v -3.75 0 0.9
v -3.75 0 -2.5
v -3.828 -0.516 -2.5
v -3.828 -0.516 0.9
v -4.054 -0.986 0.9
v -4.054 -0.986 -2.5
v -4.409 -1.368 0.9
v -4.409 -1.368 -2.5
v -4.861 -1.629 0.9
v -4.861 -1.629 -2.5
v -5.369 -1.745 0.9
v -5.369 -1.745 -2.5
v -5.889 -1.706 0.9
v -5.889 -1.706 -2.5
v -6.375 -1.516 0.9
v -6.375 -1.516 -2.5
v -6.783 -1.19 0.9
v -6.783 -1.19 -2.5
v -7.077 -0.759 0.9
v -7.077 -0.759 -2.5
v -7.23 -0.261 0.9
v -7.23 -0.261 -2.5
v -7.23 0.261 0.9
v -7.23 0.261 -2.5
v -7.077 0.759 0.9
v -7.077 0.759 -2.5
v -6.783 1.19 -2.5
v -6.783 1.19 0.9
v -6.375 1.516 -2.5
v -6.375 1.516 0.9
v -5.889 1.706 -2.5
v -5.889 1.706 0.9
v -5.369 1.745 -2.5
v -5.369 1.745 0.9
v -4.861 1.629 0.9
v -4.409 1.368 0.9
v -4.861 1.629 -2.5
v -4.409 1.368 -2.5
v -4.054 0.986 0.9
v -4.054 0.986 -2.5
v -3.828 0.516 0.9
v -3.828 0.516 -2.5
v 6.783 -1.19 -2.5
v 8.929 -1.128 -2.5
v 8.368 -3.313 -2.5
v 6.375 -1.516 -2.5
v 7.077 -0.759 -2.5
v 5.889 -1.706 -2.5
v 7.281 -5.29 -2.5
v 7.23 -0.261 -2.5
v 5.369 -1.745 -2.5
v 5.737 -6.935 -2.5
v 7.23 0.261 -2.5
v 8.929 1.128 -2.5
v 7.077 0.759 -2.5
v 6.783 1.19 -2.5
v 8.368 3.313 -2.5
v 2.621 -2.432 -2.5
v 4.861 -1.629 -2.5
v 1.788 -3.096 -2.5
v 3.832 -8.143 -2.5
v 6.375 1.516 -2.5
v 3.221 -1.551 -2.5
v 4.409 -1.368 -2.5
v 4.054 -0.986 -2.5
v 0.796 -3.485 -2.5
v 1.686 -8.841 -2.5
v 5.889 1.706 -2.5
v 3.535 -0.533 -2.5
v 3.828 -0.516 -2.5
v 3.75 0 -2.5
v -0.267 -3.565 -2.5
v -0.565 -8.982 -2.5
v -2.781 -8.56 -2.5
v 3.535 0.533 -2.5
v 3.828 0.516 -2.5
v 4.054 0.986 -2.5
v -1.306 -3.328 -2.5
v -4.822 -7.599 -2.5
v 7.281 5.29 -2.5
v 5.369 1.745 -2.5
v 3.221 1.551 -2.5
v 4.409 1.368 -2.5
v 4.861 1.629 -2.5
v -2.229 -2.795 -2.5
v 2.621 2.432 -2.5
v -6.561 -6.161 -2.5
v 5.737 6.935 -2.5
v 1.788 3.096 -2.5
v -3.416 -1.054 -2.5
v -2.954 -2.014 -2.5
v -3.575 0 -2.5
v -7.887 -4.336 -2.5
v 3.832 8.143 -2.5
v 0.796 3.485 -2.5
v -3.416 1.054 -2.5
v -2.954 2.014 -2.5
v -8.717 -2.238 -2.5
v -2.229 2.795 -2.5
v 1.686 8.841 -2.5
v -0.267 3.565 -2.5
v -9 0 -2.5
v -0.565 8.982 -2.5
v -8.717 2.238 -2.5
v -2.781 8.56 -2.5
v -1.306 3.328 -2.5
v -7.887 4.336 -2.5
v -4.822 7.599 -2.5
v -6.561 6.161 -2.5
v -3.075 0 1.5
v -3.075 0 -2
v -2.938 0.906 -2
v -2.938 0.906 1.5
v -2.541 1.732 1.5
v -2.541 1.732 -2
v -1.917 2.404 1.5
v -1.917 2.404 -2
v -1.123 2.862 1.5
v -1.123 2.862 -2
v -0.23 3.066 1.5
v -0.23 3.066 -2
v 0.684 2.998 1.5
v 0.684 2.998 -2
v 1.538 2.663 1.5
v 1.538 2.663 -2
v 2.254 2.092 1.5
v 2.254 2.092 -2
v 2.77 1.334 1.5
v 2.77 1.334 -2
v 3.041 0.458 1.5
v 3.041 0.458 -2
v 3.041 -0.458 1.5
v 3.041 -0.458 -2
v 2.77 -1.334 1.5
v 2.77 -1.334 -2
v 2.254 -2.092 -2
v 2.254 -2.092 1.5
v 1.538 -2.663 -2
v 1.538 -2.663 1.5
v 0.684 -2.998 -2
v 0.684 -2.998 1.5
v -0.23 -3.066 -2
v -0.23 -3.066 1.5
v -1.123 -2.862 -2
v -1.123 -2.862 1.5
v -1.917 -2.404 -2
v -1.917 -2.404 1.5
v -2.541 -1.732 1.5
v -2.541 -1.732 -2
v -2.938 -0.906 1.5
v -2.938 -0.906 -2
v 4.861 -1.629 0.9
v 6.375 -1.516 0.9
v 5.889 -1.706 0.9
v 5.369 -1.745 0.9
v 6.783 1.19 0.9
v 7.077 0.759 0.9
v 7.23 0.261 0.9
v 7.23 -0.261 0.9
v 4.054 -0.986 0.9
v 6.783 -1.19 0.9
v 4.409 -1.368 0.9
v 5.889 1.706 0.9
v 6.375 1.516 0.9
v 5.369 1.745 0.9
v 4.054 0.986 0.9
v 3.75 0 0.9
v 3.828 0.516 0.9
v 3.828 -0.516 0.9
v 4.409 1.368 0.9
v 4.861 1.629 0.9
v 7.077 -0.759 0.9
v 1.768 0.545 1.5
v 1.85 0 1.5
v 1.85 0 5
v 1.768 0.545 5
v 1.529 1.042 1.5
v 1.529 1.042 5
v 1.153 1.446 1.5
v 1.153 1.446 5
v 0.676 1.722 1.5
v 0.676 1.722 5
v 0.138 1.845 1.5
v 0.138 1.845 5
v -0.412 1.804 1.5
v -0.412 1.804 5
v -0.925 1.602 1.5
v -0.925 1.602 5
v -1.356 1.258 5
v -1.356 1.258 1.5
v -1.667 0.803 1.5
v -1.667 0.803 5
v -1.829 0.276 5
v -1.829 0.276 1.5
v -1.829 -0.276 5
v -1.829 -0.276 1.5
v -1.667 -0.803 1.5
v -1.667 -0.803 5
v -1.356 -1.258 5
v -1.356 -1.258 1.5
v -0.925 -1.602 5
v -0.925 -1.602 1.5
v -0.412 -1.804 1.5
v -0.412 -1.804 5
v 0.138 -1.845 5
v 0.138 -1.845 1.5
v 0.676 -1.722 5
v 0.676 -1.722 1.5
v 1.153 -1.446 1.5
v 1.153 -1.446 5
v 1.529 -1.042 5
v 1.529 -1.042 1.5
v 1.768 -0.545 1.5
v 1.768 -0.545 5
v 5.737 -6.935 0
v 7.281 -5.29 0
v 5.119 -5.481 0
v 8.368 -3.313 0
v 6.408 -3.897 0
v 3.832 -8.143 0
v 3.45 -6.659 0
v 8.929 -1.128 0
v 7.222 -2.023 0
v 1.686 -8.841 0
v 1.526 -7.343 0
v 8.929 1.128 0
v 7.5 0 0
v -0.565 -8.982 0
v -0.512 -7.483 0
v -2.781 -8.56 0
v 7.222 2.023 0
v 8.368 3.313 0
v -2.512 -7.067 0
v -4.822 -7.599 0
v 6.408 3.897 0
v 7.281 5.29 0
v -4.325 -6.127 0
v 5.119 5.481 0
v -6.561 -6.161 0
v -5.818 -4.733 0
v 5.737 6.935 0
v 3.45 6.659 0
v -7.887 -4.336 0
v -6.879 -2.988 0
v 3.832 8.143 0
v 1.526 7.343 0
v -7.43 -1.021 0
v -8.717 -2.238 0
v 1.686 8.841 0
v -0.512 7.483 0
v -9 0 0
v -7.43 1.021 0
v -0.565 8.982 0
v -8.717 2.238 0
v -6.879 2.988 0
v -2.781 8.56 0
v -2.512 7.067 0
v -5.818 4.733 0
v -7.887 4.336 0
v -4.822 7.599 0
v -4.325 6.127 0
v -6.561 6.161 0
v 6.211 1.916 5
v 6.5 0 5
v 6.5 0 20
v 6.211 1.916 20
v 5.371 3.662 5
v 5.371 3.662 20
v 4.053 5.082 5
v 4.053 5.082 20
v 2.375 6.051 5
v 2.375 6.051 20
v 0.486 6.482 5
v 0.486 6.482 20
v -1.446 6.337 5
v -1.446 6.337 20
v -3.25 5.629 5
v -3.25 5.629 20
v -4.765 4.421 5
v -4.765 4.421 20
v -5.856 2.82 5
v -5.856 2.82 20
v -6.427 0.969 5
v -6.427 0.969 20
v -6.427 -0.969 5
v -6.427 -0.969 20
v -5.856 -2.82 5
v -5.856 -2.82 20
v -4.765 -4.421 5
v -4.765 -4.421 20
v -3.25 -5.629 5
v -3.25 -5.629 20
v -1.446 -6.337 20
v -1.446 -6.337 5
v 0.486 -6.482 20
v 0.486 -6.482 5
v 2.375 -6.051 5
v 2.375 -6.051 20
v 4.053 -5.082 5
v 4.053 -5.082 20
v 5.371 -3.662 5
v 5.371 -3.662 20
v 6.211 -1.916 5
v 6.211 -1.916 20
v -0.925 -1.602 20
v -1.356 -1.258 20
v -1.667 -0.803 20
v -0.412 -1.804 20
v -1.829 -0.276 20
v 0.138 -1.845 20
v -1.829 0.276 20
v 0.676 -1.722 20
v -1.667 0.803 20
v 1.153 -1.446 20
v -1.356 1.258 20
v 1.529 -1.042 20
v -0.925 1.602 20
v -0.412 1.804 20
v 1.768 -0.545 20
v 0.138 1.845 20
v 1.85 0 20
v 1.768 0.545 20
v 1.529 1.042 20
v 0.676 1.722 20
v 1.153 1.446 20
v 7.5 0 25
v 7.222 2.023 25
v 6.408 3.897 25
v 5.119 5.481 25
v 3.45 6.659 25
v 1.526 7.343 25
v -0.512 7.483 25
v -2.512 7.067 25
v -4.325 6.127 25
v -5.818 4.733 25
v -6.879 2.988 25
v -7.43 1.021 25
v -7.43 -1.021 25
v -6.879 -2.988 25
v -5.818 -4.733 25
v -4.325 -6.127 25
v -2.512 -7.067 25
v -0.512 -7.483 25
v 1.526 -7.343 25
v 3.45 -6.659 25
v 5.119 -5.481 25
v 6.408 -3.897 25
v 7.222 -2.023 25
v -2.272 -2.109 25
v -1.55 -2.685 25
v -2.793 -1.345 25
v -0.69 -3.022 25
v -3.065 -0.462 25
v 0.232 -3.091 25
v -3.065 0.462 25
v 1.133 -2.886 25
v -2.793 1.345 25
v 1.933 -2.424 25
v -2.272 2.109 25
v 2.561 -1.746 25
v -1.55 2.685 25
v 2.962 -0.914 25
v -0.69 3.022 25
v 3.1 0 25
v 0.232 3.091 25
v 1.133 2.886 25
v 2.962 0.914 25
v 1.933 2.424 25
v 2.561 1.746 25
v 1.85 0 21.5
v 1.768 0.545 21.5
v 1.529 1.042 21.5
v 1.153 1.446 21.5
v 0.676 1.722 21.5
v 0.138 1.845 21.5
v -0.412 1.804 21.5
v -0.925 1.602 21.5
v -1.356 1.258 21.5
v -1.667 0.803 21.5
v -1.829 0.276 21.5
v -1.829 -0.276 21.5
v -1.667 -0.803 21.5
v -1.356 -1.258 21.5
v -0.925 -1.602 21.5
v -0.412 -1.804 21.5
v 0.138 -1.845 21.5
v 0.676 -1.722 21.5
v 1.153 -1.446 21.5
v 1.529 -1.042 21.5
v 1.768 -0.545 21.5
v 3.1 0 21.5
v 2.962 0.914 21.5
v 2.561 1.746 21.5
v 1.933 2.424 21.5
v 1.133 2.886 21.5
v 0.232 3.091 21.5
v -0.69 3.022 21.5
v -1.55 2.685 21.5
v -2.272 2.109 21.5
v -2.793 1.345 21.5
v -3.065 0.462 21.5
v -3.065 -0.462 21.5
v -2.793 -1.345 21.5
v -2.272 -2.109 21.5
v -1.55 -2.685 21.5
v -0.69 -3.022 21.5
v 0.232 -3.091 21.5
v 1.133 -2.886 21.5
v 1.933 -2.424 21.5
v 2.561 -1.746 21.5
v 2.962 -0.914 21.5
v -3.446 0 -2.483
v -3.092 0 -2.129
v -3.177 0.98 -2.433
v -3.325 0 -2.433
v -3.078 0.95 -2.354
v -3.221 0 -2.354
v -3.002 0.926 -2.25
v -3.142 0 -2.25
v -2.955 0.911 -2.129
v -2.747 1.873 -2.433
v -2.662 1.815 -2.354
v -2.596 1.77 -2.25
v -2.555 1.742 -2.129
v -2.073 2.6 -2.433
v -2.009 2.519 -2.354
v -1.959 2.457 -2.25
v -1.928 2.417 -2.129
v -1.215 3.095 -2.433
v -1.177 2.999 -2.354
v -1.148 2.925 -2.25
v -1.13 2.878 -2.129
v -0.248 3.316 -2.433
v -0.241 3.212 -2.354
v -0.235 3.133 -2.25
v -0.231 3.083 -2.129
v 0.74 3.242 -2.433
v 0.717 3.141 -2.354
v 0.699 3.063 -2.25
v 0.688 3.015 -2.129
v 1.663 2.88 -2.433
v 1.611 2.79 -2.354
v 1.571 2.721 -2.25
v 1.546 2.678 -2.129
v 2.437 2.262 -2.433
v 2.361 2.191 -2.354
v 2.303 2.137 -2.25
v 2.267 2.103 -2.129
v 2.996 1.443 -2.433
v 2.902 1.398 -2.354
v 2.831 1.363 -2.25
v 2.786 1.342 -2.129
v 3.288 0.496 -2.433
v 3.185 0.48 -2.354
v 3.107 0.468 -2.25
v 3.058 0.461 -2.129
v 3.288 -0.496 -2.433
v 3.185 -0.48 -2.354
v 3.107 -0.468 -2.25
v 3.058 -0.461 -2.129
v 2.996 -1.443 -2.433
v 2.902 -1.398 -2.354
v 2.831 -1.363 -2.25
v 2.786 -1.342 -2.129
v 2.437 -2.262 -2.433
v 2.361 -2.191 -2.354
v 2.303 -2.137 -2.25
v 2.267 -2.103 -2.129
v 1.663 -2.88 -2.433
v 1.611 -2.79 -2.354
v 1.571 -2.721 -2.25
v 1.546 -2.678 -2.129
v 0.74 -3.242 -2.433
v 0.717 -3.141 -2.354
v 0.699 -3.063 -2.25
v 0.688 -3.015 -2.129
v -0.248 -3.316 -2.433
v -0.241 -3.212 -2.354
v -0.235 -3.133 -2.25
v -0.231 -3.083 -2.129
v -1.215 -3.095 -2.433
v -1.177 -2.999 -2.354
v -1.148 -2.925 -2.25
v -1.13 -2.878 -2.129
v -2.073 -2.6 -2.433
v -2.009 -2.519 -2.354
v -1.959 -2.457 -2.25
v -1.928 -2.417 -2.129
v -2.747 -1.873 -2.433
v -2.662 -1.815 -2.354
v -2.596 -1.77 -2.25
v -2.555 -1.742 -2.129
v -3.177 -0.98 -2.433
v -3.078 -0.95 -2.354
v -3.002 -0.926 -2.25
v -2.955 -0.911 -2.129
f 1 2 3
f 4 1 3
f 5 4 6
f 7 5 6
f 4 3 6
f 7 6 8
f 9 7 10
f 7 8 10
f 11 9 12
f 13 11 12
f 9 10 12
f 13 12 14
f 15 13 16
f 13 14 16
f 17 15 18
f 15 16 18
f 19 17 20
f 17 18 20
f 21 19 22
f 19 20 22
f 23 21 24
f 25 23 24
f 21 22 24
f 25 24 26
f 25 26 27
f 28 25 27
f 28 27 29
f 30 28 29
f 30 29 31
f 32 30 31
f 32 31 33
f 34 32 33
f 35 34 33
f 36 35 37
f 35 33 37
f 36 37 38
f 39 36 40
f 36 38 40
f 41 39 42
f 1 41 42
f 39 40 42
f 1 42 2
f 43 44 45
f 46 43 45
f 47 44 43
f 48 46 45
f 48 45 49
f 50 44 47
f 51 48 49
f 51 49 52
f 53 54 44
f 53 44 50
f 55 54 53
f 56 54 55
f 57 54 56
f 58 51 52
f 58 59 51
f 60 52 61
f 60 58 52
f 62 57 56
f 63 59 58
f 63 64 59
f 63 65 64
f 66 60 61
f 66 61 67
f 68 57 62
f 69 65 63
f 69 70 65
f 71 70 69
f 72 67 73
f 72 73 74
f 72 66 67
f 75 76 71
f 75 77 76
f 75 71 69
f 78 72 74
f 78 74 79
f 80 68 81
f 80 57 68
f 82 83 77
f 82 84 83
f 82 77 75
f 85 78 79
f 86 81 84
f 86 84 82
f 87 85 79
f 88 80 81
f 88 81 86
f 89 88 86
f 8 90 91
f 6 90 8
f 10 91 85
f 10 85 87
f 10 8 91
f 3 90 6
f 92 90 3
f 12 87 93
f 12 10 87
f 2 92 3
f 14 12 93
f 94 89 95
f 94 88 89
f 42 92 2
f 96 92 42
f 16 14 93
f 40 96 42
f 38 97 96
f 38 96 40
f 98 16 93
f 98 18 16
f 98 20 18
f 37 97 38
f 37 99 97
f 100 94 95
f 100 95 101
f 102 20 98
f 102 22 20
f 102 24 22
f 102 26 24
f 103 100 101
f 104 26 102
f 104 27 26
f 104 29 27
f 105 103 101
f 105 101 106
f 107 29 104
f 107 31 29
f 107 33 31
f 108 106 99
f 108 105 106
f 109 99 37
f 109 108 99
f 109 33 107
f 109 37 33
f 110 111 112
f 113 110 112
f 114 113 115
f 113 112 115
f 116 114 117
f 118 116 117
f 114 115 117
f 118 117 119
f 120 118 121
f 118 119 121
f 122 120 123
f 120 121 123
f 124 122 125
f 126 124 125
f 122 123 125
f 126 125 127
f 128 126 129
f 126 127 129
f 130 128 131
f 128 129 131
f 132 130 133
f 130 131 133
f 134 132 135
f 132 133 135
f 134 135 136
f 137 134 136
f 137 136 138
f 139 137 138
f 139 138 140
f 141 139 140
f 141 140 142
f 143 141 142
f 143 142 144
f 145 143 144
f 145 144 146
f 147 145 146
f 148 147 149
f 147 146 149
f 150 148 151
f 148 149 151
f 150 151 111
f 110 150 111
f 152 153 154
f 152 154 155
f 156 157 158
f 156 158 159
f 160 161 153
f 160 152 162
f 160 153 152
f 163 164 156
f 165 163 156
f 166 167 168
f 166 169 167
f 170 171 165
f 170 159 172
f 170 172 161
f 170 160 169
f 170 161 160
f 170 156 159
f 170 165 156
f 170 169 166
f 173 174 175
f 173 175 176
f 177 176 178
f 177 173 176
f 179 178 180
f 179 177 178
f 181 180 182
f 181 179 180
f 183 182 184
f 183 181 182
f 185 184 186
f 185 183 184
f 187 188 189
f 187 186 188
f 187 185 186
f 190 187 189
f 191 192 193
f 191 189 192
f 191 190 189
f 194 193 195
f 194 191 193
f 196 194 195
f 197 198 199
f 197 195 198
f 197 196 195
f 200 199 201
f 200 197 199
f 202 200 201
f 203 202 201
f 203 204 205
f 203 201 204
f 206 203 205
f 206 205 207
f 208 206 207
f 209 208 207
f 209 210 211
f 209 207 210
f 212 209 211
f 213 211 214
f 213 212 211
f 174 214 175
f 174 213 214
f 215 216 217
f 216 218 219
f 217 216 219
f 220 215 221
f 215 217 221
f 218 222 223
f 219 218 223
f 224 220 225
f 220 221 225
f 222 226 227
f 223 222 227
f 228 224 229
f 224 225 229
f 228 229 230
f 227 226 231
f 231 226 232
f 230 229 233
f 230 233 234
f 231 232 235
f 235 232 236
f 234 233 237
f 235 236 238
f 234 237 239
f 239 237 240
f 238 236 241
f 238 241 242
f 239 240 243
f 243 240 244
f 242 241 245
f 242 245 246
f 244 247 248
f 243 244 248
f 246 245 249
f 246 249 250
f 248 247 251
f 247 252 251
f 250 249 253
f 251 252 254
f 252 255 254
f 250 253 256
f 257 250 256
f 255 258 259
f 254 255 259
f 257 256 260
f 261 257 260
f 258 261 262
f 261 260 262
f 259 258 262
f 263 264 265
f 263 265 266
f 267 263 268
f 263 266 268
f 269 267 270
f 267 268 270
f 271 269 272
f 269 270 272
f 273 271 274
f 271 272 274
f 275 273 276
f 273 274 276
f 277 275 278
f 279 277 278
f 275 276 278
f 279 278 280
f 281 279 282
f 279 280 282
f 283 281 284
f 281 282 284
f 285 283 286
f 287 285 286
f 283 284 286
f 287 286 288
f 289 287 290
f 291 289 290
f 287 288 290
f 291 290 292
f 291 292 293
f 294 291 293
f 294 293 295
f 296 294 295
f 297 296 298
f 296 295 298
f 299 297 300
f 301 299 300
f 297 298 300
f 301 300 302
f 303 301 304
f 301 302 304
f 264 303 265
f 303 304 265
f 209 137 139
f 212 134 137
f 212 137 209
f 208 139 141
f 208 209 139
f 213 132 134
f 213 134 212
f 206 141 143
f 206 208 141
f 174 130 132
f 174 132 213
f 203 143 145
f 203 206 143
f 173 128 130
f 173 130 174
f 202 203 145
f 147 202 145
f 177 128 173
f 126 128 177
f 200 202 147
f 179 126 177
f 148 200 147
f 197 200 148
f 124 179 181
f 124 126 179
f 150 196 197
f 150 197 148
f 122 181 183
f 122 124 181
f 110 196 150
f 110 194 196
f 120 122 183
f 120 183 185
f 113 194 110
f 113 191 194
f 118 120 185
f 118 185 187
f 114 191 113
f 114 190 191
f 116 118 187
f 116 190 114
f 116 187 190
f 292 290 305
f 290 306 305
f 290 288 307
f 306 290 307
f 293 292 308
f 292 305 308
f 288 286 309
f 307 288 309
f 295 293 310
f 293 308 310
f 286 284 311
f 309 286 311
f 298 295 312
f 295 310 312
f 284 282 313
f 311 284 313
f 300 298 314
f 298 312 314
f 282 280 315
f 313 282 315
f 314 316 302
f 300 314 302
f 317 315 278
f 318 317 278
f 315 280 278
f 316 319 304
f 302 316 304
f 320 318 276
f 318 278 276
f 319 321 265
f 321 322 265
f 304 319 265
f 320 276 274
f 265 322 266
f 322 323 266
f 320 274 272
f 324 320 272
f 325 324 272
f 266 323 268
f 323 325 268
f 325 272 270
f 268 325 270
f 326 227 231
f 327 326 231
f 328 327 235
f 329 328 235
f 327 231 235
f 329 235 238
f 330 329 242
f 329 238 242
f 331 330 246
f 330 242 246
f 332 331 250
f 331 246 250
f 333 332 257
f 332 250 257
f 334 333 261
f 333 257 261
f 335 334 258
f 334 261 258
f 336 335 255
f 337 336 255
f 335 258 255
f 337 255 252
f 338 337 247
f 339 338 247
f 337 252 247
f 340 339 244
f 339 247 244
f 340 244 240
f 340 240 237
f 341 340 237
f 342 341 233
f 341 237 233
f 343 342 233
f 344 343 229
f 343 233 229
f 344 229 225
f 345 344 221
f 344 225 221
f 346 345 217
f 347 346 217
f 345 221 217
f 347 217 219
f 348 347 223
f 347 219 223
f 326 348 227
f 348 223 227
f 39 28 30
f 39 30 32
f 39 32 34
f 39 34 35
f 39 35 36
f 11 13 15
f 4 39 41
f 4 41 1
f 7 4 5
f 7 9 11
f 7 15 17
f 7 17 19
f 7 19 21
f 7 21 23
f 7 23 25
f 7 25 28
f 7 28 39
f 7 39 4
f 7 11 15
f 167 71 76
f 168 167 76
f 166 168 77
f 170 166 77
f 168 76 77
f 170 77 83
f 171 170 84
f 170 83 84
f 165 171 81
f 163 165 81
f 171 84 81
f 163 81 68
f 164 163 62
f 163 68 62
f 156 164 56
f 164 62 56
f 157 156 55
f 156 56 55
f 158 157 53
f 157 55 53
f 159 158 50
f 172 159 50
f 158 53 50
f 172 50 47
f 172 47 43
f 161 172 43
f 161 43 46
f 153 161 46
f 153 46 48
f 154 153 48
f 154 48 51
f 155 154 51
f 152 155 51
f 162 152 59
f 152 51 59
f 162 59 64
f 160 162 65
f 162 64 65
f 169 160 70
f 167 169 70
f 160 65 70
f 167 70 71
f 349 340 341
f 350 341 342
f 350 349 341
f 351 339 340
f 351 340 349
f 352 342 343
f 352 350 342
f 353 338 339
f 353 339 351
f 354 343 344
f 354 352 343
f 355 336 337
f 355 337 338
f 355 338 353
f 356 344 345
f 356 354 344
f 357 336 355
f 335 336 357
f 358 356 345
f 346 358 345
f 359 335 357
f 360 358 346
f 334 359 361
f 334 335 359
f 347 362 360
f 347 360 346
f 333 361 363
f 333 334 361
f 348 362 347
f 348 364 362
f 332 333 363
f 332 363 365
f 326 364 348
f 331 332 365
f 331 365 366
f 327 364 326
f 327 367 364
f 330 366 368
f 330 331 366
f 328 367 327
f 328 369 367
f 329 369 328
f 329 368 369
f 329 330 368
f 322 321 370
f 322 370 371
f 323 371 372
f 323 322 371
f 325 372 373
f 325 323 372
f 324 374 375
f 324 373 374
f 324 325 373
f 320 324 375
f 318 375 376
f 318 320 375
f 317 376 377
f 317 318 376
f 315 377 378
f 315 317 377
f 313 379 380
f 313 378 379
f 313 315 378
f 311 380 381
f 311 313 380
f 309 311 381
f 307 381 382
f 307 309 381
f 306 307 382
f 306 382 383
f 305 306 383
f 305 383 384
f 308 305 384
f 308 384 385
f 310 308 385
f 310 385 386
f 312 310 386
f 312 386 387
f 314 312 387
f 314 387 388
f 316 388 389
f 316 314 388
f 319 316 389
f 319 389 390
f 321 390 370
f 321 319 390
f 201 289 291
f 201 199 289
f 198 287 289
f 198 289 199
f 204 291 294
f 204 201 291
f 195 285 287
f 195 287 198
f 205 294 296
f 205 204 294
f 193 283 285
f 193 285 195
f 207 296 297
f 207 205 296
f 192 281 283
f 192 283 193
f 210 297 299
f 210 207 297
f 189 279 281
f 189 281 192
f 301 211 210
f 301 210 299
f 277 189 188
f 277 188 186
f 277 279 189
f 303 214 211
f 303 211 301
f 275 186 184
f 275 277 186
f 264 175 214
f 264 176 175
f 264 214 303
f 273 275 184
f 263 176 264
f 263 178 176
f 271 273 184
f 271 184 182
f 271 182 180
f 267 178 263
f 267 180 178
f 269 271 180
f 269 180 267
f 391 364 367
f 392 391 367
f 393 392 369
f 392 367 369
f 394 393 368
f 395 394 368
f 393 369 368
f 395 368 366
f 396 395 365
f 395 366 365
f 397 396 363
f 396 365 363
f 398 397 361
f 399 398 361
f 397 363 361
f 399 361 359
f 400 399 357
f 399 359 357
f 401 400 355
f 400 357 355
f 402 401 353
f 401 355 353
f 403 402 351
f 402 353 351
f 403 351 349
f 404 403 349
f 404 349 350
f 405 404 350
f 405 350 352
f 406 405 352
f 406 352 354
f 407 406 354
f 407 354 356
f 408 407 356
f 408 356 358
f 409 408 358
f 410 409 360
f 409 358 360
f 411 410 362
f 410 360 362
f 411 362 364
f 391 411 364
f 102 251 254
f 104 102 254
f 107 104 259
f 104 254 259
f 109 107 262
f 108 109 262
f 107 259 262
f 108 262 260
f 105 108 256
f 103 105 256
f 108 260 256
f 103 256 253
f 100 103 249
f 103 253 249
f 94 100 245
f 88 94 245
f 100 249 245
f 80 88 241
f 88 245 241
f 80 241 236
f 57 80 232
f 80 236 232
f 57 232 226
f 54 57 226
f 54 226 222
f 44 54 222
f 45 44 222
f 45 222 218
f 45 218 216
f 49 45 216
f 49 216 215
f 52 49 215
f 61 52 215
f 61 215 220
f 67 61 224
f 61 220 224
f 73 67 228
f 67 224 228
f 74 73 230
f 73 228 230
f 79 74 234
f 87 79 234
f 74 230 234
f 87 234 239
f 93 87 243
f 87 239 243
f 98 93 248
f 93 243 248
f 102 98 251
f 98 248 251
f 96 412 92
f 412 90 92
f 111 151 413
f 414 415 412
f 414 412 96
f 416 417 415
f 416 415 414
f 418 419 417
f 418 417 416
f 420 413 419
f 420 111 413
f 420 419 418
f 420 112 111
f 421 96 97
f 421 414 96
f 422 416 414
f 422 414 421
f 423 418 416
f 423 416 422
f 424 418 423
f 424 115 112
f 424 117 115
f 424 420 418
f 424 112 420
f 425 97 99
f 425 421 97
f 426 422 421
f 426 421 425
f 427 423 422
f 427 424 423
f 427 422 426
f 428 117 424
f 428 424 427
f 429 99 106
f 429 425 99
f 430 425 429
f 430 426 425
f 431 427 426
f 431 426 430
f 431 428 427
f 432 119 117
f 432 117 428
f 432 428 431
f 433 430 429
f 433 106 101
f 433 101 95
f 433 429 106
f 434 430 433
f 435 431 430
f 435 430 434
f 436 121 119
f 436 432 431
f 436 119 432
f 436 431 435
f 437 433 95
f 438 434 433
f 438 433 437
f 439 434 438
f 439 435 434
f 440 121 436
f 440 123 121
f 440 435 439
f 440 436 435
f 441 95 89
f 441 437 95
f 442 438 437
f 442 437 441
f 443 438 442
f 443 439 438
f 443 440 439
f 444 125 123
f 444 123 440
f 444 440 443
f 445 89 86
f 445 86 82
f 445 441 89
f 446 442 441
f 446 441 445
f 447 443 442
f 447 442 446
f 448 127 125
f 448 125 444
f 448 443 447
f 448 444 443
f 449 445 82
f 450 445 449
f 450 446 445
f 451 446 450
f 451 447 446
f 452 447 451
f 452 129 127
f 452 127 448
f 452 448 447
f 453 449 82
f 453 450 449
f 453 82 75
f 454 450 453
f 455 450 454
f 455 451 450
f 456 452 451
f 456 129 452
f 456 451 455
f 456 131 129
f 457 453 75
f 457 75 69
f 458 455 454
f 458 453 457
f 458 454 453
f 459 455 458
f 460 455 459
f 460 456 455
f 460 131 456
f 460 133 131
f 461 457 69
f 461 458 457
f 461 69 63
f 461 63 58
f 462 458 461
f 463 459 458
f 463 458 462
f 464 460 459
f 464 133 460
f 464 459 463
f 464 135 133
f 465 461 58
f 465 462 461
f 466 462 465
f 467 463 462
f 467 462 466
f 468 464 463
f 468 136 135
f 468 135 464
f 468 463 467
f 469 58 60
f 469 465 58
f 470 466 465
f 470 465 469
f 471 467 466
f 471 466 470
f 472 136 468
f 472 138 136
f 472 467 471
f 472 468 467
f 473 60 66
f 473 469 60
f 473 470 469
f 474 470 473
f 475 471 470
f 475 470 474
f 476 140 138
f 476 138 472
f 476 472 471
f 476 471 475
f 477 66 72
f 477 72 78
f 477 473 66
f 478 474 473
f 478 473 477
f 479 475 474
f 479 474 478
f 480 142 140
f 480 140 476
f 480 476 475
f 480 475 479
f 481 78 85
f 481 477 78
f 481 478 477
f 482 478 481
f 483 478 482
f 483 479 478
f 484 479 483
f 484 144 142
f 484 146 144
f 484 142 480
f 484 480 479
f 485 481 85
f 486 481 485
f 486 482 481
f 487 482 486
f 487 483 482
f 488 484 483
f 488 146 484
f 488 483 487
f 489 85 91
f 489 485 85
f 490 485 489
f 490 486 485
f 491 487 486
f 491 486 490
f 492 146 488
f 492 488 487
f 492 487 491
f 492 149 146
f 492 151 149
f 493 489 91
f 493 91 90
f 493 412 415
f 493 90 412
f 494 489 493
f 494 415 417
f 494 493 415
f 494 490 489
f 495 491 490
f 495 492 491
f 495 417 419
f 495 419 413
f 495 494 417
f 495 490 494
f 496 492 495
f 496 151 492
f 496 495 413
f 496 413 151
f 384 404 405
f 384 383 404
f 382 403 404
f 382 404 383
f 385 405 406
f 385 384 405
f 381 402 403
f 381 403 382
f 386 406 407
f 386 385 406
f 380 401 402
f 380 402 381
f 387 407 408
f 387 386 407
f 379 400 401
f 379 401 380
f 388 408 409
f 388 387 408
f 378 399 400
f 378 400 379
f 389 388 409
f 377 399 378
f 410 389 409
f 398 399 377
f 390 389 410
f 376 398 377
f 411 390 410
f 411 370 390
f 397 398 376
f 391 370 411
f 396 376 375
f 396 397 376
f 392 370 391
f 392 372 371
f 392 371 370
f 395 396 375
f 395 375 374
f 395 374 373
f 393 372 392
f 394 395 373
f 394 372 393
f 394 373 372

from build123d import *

# Parameters (mm, degrees)
CROQUIS1_R              = 7.5
CROQUIS1_R_2            = 1.85
SALIENTE_EXTRUIR1_DEPTH = 25
CROQUIS2_R              = 6.5
CORTAR_EXTRUIR1_DEPTH   = 7.5
CROQUIS3_R              = 9
SALIENTE_EXTRUIR2_DEPTH = 2.5
CROQUIS4_R              = 3.1
CORTAR_EXTRUIR2_DEPTH   = 3.5
CROQUIS5_R              = 3.075
CORTAR_EXTRUIR3_DEPTH   = 4
REDONDEO1_R             = 0.5
CROQUIS6_R              = 1.75
CORTAR_EXTRUIR4_DEPTH   = 3.4


with BuildPart() as part:
    # Croquis1 → Saliente-Extruir1 (new body)
    with BuildSketch(Plane.XY):
        Circle(CROQUIS1_R)
        Circle(CROQUIS1_R_2, mode=Mode.SUBTRACT)
    extrude(amount=SALIENTE_EXTRUIR1_DEPTH)

    # Croquis2 → Cortar-Extruir1 (cut, symmetric)
    with BuildSketch(Plane.XY.offset(12.5)):
        Circle(CROQUIS2_R)
    extrude(amount=CORTAR_EXTRUIR1_DEPTH, both=True, mode=Mode.SUBTRACT)

    # Croquis3 → Saliente-Extruir2 (add)
    with BuildSketch(Plane(origin=(0, 0, 0), x_dir=(-1, 0, 0), z_dir=(0, 0, -1))):
        Circle(CROQUIS3_R)
    extrude(amount=SALIENTE_EXTRUIR2_DEPTH)

    # Croquis4 → Cortar-Extruir2 (cut)
    with BuildSketch(Plane.XY.offset(25)):
        Circle(CROQUIS4_R)
    extrude(amount=-CORTAR_EXTRUIR2_DEPTH, mode=Mode.SUBTRACT)

    # Croquis5 → Cortar-Extruir3 (cut)
    with BuildSketch(Plane(origin=(0, 0, -2.5), x_dir=(-1, 0, 0), z_dir=(0, 0, -1))):
        Circle(CROQUIS5_R)
    extrude(amount=-CORTAR_EXTRUIR3_DEPTH, mode=Mode.SUBTRACT)

    # Redondeo1
    redondeo1_edges = [part.edges().sort_by_distance(p)[0] for p in [
        (3.075, 0, -2.5),
    ]]
    fillet(redondeo1_edges, radius=REDONDEO1_R)

    # Croquis6 → Cortar-Extruir4 (cut)
    with BuildSketch(Plane(origin=(0, 0, -2.5), x_dir=(-1, 0, 0), z_dir=(0, 0, -1))):
        with Locations((-5.5, 0)):
            Circle(CROQUIS6_R)
        with Locations(Location((5.5, 0, 0), (0, 0, 180))):
            Circle(CROQUIS6_R)
    extrude(amount=-CORTAR_EXTRUIR4_DEPTH, mode=Mode.SUBTRACT)


solid = part.part
